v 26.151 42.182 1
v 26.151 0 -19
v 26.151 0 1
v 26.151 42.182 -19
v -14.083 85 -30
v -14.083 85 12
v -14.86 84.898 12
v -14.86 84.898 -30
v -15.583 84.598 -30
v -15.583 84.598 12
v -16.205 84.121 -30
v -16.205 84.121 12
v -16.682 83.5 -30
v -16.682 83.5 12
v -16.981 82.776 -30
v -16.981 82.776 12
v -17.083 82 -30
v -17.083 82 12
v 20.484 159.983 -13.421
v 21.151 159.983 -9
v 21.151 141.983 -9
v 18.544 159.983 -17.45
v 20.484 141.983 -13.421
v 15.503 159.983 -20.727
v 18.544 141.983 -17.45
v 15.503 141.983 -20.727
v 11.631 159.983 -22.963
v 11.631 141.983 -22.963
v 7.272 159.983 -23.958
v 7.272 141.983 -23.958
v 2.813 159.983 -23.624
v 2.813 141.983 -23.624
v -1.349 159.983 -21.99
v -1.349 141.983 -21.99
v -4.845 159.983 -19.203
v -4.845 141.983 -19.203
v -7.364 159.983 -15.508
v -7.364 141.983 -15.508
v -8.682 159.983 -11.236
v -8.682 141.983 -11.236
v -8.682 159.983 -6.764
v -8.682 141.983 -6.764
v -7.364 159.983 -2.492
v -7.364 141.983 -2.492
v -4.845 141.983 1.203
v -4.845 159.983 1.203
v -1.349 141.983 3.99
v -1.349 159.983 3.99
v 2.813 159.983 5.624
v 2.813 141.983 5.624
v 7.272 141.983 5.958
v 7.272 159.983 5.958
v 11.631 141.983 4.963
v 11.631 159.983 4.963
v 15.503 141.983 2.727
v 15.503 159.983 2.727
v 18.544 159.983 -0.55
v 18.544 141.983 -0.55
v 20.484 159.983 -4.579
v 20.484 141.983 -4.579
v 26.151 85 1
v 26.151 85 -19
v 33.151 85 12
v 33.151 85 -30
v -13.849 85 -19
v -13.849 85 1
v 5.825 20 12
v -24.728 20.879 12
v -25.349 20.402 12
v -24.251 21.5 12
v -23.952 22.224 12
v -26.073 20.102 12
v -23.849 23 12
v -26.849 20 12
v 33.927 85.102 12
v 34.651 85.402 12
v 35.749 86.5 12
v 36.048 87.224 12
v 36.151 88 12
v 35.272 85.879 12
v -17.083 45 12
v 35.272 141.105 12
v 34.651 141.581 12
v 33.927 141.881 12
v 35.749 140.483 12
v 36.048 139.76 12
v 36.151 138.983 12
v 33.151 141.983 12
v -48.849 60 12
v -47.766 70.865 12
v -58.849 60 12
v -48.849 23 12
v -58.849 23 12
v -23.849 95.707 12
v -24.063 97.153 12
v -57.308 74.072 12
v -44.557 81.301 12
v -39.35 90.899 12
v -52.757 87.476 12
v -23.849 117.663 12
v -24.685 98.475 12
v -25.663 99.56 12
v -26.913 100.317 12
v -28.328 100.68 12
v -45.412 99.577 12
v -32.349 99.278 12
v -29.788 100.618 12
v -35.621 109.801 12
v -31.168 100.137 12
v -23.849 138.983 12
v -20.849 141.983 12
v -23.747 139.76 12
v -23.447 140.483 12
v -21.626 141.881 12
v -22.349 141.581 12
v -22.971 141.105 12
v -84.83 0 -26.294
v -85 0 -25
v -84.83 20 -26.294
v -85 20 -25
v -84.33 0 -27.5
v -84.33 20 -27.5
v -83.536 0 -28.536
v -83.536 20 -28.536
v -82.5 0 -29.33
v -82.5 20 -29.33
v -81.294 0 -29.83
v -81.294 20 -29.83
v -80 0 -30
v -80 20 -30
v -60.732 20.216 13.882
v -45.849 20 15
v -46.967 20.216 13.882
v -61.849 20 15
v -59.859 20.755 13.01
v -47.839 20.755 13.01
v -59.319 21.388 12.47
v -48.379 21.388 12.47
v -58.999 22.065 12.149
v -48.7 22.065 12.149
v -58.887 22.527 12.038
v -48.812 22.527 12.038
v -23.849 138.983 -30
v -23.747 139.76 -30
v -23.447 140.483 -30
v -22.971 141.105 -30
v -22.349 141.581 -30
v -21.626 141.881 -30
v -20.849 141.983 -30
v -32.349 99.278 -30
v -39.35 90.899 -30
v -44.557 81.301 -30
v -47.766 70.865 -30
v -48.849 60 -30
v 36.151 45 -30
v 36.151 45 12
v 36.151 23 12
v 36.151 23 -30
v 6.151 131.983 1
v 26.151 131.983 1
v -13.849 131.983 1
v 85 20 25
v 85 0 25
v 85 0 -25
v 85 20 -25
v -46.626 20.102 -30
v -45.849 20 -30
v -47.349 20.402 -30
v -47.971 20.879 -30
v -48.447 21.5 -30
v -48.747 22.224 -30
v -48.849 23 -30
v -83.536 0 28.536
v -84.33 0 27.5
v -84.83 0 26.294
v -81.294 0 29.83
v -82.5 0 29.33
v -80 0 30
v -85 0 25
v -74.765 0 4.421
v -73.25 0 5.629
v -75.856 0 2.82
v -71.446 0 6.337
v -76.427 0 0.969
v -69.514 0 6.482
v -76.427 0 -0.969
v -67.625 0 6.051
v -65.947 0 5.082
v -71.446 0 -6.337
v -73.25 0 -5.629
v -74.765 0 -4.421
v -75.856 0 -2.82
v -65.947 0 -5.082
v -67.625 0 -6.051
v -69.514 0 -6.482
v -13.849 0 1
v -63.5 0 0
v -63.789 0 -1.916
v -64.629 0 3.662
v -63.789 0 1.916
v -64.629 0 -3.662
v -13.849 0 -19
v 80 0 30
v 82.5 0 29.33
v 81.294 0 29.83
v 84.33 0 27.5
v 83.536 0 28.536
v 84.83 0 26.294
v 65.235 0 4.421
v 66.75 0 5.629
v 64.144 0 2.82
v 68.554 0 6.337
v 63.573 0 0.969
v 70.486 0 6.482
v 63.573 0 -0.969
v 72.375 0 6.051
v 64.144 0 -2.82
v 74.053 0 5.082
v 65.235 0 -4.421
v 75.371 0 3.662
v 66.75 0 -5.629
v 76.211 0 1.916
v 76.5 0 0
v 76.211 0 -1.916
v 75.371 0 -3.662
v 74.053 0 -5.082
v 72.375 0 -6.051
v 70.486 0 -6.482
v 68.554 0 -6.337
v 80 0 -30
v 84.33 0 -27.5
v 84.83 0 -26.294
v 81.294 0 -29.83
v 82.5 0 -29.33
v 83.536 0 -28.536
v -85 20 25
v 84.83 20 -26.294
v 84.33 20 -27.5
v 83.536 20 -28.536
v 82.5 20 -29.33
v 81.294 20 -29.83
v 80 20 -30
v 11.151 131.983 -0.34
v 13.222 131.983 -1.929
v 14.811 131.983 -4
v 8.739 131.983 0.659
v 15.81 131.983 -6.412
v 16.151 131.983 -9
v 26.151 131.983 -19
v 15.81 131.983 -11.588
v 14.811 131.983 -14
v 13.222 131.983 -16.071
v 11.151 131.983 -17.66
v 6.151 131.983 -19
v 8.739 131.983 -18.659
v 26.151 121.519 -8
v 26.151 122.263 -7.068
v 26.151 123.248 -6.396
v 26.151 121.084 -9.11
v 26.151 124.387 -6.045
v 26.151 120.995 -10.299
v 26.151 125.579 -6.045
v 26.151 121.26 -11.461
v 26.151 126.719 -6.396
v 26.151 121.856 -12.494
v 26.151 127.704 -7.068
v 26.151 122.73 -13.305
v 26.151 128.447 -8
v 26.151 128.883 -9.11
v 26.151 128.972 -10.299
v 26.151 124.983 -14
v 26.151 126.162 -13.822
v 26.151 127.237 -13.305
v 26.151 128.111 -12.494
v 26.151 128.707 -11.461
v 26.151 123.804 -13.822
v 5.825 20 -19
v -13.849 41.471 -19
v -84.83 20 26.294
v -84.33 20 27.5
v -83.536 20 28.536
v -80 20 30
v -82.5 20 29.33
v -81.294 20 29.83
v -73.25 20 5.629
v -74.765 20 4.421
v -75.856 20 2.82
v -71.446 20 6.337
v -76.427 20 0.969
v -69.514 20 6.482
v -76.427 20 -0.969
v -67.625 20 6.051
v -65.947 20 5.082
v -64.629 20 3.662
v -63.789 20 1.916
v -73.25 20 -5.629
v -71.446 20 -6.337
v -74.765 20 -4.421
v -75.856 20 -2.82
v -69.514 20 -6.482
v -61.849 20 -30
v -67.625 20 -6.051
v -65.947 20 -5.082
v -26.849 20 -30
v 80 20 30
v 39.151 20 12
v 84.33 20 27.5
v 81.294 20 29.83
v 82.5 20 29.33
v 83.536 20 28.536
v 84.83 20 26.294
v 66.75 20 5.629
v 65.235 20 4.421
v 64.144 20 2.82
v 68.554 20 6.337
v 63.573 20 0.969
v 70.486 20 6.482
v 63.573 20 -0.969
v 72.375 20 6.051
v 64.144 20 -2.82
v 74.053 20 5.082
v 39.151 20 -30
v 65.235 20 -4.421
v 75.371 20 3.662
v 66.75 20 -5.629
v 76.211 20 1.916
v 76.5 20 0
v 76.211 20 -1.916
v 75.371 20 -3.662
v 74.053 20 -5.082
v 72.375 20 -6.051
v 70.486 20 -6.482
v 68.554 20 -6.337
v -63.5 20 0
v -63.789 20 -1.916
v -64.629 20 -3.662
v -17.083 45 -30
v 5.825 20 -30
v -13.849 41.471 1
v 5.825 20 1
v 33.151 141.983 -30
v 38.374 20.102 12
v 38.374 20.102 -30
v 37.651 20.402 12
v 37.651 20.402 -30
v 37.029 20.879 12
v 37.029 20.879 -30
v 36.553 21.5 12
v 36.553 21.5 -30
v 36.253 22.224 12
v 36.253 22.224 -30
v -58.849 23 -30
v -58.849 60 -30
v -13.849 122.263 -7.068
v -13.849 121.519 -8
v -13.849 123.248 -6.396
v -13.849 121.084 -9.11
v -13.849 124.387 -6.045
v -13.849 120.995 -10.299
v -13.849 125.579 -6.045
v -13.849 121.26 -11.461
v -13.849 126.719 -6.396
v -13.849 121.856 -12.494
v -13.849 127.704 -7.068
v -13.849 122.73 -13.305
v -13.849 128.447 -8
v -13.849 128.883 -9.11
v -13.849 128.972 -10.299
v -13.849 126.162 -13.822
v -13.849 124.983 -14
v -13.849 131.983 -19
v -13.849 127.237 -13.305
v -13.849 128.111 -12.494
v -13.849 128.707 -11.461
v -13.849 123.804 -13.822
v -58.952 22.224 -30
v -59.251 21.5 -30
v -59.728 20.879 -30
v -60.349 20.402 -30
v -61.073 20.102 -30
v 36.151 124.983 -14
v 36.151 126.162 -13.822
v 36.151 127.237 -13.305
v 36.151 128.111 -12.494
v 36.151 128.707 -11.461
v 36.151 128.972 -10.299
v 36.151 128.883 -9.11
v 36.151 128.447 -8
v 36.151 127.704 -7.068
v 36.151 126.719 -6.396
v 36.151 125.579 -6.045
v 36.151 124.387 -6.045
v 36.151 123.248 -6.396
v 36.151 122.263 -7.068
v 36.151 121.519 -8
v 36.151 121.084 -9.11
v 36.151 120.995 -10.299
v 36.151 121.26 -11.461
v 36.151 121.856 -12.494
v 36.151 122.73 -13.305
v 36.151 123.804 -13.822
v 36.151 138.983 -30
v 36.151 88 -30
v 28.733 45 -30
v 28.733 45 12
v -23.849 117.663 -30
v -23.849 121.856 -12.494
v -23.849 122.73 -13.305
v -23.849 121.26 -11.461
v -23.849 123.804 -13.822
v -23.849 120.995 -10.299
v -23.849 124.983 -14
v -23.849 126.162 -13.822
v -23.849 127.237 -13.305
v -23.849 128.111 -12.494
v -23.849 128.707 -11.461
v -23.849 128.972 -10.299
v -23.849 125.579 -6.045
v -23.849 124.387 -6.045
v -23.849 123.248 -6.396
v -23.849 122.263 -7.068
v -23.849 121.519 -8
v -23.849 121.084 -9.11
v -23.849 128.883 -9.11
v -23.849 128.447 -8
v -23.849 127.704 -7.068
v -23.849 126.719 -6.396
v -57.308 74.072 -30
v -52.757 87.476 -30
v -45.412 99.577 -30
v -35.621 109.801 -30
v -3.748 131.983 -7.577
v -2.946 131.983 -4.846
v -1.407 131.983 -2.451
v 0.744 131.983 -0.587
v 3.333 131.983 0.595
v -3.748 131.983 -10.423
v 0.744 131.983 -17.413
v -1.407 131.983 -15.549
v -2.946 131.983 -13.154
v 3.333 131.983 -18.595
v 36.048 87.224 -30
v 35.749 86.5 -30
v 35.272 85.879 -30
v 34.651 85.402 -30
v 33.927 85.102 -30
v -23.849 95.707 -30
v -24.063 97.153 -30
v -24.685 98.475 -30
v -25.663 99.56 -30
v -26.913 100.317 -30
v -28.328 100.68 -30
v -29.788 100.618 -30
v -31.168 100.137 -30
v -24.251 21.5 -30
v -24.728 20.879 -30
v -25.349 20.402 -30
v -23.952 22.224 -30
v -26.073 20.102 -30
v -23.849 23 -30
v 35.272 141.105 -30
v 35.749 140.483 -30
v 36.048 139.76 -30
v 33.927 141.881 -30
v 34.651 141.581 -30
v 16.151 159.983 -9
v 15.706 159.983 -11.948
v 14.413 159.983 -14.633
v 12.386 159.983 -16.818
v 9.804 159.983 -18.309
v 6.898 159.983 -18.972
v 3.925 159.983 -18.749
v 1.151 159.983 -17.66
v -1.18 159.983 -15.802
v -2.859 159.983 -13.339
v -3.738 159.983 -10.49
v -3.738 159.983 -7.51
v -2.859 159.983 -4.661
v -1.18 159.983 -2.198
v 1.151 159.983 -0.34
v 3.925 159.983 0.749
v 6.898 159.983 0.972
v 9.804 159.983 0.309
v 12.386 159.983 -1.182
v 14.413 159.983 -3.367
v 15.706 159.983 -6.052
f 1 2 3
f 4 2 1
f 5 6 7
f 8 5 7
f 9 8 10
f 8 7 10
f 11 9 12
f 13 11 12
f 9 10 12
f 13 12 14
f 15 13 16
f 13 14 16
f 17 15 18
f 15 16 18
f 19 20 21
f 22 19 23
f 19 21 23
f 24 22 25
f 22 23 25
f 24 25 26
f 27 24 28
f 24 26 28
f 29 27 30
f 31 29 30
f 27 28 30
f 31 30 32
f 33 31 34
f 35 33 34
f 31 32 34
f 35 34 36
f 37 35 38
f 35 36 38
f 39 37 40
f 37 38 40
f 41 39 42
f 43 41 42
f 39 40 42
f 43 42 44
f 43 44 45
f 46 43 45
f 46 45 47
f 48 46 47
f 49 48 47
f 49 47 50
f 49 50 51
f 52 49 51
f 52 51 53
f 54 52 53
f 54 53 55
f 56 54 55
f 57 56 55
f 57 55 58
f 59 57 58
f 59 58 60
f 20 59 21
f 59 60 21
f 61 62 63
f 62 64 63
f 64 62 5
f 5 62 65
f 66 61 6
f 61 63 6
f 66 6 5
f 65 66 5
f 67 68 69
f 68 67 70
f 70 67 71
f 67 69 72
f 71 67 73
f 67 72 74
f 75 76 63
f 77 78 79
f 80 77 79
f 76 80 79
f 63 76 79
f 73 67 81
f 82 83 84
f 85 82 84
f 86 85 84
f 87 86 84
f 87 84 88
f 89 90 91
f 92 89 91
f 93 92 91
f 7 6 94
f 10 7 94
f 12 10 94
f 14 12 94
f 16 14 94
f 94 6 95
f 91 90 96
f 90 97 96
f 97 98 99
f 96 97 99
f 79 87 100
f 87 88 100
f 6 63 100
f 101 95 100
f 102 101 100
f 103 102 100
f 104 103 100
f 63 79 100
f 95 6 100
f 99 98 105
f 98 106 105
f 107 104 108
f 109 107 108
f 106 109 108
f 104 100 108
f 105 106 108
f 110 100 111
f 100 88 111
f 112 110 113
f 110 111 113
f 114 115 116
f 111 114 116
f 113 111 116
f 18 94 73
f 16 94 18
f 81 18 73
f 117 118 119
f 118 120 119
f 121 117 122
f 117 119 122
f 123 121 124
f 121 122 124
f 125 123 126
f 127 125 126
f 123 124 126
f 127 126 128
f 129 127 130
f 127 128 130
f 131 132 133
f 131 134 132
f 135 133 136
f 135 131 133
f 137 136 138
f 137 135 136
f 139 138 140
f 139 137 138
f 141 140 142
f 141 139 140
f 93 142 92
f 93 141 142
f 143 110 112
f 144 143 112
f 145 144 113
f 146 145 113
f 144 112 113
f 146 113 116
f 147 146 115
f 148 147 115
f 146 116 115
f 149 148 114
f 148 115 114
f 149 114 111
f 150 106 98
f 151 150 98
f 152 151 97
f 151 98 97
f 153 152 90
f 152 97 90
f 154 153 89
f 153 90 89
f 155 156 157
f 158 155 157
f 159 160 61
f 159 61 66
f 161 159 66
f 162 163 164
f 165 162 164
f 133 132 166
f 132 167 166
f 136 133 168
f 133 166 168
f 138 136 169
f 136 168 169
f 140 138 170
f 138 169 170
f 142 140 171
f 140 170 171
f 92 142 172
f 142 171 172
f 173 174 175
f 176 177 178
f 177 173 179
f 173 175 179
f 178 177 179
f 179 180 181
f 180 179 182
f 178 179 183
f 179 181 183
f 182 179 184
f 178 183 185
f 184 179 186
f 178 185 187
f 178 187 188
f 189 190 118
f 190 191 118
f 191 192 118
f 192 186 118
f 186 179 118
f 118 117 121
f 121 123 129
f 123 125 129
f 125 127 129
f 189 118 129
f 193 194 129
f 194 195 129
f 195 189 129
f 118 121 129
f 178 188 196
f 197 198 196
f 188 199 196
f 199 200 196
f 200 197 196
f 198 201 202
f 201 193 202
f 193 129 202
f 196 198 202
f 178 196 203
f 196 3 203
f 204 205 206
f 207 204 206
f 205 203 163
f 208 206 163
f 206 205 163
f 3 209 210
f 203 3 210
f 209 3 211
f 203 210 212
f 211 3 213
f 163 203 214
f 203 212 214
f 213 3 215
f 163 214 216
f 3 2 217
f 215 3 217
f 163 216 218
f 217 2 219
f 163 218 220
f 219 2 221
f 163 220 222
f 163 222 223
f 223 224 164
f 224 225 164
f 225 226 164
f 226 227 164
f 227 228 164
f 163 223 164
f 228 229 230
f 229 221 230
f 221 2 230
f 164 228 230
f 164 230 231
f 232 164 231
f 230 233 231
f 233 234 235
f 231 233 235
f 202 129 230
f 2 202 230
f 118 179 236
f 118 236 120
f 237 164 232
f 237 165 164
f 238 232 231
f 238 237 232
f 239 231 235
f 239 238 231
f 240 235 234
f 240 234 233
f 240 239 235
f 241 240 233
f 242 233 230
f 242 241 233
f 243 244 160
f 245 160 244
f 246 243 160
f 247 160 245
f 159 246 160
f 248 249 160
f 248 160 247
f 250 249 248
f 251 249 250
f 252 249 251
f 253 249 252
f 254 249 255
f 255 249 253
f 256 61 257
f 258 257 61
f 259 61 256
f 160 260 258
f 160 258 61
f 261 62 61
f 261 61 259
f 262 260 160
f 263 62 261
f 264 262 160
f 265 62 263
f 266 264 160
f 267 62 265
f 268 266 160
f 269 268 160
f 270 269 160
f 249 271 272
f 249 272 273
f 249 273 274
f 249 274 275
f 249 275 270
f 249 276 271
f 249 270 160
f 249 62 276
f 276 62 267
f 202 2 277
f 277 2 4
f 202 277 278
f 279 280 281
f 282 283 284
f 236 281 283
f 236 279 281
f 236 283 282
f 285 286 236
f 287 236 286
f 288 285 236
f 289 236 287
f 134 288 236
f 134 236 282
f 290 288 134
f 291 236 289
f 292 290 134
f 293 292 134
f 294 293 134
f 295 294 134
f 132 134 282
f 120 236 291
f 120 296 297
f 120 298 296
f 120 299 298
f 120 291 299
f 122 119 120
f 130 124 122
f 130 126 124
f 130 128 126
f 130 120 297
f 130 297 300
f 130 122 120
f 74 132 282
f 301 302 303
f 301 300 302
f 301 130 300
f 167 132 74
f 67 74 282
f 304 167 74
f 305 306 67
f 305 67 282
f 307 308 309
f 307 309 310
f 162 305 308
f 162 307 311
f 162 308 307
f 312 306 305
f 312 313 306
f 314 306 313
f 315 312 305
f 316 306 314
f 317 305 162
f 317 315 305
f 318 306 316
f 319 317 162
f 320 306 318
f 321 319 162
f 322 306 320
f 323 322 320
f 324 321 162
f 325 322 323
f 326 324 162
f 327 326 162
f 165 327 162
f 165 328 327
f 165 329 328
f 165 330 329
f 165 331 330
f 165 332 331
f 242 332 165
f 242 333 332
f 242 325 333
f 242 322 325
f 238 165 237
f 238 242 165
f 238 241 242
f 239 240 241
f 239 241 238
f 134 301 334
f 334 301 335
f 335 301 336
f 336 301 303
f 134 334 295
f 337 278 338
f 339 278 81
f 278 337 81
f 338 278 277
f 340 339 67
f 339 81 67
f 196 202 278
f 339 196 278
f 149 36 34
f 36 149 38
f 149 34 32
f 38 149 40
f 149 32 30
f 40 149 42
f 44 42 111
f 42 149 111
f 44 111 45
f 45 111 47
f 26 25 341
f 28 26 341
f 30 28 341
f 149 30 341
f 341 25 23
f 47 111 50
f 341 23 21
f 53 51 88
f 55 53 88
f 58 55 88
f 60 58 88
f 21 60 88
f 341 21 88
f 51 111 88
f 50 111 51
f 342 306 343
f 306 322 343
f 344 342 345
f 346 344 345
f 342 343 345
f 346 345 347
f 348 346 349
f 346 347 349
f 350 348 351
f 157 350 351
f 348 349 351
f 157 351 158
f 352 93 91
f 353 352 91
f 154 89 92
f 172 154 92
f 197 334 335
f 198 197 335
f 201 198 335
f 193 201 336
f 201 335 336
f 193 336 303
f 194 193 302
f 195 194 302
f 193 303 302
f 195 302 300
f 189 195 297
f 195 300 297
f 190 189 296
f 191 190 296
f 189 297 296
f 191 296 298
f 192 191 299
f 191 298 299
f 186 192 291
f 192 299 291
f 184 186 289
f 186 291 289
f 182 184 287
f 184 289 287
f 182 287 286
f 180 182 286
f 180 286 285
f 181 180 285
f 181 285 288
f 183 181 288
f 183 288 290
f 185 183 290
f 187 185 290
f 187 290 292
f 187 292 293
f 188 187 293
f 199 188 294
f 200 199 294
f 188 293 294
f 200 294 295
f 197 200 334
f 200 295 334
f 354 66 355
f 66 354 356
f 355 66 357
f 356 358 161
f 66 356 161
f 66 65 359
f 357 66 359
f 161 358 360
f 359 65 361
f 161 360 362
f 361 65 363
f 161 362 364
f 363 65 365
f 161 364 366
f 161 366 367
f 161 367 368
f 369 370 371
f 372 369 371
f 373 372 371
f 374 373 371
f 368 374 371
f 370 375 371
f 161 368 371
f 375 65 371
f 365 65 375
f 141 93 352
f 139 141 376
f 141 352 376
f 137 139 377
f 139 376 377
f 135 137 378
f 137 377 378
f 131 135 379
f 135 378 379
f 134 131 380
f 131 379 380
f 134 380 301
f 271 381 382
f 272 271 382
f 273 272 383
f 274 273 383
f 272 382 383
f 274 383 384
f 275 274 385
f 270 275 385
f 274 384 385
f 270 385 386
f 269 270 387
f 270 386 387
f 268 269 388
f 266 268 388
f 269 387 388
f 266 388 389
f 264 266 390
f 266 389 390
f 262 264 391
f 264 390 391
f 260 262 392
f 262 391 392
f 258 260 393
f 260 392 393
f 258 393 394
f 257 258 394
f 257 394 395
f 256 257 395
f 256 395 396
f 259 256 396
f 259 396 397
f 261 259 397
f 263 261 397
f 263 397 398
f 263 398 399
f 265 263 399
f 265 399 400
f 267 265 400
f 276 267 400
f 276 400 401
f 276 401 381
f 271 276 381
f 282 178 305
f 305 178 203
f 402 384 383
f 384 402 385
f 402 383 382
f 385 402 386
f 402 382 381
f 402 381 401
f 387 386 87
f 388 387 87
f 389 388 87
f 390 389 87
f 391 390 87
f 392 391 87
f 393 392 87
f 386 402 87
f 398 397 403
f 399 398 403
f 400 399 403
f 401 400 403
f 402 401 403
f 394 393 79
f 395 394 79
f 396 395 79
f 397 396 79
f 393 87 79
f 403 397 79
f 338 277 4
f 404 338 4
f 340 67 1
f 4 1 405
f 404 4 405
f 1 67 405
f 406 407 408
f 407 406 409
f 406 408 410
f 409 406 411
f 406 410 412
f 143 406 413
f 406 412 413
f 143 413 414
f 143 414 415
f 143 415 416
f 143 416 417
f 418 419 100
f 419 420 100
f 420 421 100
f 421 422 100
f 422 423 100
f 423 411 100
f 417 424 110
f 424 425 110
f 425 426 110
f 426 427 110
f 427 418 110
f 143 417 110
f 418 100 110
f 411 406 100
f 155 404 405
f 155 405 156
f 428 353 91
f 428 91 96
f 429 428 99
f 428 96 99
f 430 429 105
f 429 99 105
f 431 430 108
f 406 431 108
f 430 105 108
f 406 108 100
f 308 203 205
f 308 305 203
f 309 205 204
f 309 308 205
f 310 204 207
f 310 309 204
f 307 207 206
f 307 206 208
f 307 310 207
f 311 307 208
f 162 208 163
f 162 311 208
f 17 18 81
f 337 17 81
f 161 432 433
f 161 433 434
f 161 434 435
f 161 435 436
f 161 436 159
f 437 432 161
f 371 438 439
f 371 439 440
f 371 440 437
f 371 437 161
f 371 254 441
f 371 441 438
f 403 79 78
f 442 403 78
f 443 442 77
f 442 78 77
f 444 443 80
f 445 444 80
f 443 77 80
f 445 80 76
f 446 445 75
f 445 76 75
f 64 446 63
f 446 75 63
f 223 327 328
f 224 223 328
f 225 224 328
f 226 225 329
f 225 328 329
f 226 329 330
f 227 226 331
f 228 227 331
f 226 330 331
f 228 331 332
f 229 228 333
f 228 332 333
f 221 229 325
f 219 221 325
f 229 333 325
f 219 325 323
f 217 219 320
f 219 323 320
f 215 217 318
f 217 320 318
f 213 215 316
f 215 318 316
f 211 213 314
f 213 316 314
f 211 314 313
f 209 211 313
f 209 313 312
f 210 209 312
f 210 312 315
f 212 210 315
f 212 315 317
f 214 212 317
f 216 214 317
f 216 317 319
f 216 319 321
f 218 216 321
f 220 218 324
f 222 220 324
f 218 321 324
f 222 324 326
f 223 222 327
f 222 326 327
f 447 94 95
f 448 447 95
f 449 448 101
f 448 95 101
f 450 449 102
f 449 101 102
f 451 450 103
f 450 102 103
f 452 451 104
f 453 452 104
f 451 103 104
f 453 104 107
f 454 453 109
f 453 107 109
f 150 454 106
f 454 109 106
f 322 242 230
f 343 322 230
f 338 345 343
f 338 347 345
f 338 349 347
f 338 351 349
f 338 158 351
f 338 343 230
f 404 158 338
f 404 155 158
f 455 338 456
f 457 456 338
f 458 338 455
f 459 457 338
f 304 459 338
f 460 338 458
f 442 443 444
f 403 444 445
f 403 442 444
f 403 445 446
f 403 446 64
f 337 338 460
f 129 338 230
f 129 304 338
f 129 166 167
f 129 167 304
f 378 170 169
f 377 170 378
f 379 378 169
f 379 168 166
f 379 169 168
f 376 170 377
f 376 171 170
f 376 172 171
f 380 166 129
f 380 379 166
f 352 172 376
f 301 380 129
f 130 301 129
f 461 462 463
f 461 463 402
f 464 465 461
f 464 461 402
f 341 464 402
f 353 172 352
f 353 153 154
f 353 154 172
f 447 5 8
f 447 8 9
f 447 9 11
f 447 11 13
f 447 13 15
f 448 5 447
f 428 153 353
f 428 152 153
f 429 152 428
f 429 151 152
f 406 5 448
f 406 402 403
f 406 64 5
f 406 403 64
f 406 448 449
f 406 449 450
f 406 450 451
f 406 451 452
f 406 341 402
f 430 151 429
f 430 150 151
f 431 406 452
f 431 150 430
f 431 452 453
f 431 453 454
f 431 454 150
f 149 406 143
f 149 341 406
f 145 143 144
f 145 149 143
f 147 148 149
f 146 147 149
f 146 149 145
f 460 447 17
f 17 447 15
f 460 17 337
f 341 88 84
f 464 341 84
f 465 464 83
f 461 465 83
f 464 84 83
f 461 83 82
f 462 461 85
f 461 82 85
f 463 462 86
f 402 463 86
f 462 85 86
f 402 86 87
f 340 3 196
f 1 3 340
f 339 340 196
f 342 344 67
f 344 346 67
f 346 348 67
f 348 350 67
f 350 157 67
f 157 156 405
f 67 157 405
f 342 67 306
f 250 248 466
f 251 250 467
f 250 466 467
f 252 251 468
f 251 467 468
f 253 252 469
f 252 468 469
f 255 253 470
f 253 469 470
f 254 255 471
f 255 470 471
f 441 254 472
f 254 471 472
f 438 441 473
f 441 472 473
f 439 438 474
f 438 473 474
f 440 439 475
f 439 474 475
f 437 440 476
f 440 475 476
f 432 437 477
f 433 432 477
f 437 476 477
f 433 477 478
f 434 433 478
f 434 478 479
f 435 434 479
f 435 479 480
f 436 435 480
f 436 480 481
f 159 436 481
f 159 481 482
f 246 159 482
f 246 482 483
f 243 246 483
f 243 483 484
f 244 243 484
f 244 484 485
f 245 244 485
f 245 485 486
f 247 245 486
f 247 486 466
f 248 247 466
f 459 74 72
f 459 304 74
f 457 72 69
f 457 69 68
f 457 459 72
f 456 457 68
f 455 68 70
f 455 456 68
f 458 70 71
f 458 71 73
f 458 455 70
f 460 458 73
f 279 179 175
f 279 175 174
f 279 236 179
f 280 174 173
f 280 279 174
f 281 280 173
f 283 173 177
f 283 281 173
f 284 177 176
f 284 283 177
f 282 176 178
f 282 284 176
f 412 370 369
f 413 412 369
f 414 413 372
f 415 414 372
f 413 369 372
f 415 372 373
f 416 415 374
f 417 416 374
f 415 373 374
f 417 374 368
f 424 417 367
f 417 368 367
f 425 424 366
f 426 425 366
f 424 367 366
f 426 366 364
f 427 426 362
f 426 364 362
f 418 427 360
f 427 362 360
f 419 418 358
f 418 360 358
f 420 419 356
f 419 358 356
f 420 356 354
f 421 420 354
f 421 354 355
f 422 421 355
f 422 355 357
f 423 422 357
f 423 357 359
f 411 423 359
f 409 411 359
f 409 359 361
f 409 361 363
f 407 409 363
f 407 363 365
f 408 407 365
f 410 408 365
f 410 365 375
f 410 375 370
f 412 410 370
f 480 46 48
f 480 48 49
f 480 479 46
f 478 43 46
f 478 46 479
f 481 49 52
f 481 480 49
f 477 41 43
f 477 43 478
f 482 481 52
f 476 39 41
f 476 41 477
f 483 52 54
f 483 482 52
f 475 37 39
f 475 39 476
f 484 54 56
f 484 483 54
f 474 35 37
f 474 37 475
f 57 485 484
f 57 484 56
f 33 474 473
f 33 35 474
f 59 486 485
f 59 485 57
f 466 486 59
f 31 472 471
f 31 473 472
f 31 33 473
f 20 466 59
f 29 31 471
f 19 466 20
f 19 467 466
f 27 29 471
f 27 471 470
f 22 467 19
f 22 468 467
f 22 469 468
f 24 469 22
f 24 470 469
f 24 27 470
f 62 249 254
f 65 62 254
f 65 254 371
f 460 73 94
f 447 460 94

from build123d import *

# Parameters (mm, degrees)
SKETCH1_W           = 170
SKETCH1_H           = 60
BOSS_EXTRUDE1_DEPTH = 20
FILLET1_R           = 5
BOSS_EXTRUDE2_DEPTH = 42
SKETCH5_R           = 15
BOSS_EXTRUDE3_DEPTH = 18
SKETCH6_R           = 10
CUT_EXTRUDE1_DEPTH  = 28
SKETCH7_W           = 40
SKETCH7_H           = 131.983318458
CUT_EXTRUDE2_DEPTH  = 10
FILLET5_R           = 3
SKETCH8_R           = 6.5
CUT_EXTRUDE3_DEPTH  = 20
SKETCH9_R           = 4
CUT_EXTRUDE4_DEPTH  = 60


with BuildPart() as part:
    # Sketch1 → Boss-Extrude1 (new body)
    with BuildSketch(Plane(origin=(0, 0, 0), x_dir=(1, 0, 0), z_dir=(0, 1, 0))):
        Rectangle(SKETCH1_W, SKETCH1_H)
    extrude(amount=BOSS_EXTRUDE1_DEPTH)

    # Fillet1
    fillet1_edges = [part.edges().sort_by_distance(p)[0] for p in [
        (-85, 10, -30),
        (85, 10, -30),
        (85, 10, 30),
        (-85, 10, 30),
    ]]
    fillet(fillet1_edges, radius=FILLET1_R)

    # Sketch4 → Boss-Extrude2 (add)
    with BuildSketch(Plane(origin=(0, 0, 12), x_dir=(-1, 0, 0), z_dir=(0, 0, -1))):
        with BuildLine():
            Line((48.849351026, 20), (58.849351026, 20))
            Line((58.849351026, 20), (58.849351026, 60))
            ThreePointArc((58.849351026, 60), (49.414627953, 93.726843908), (23.849351026, 117.662812973))
            Line((23.849351026, 117.662812973), (23.849351026, 138.983318458))
            ThreePointArc((23.849351026, 138.983318458), (22.970671369, 141.104638801), (20.849351026, 141.983318458))
            Line((20.849351026, 141.983318458), (-33.150648974, 141.983318458))
            ThreePointArc((-33.150648974, 141.983318458), (-35.271969318, 141.104638801), (-36.150648974, 138.983318458))
            Line((-36.150648974, 138.983318458), (-36.150648974, 88))
            ThreePointArc((-36.150648974, 88), (-35.271969318, 85.878679656), (-33.150648974, 85))
            Line((-33.150648974, 85), (14.083425542, 85))
            ThreePointArc((14.083425542, 85), (16.204745885, 84.121320344), (17.083425542, 82))
            Line((17.083425542, 82), (17.083425542, 45))
            Line((17.083425542, 45), (-5.824853809, 20))
            Line((-5.824853809, 20), (23.849351026, 20))
            Line((23.849351026, 20), (23.849351026, 95.707142143))
            ThreePointArc((23.849351026, 95.707142143), (26.912859353, 100.316914371), (32.349351026, 99.277856357))
            ThreePointArc((32.349351026, 99.277856357), (44.556845541, 81.301408404), (48.849351026, 60))
            Line((48.849351026, 60), (48.849351026, 20))
        make_face()
        Polygon((-36.150648974, 20), (-5.824853809, 20), (-28.733133159, 45), (-36.150648974, 45), align=None)
    extrude(amount=BOSS_EXTRUDE2_DEPTH)

    # Sketch5 → Boss-Extrude3 (add)
    with BuildSketch(Plane(origin=(0, 141.983318458, 0), x_dir=(1, 0, 0), z_dir=(0, 1, 0))):
        with Locations((6.150648974, 9)):
            Circle(SKETCH5_R)
    extrude(amount=BOSS_EXTRUDE3_DEPTH)

    # Sketch6 → Cut-Extrude1 (cut)
    with BuildSketch(Plane(origin=(0, 159.983318458, 0), x_dir=(1, 0, 0), z_dir=(0, 1, 0))):
        with Locations((6.150648974, 9)):
            Circle(SKETCH6_R)
    extrude(amount=-CUT_EXTRUDE1_DEPTH, mode=Mode.SUBTRACT)

    # Sketch7 → Cut-Extrude2 (cut, symmetric)
    with BuildSketch(Plane(origin=(0, 0, -9), x_dir=(-1, 0, 0), z_dir=(0, 0, -1))):
        with Locations((-6.150648974, 65.991659229)):
            Rectangle(SKETCH7_W, SKETCH7_H)
    extrude(amount=CUT_EXTRUDE2_DEPTH, both=True, mode=Mode.SUBTRACT)

    # Fillet5
    fillet5_edges = [part.edges().sort_by_distance(p)[0] for p in [
        (36.150648974, 20, -9),
        (-23.849351026, 20, -9),
        (-48.849351026, 20, -9),
        (-53.849351026, 20, 12),
        (-58.849351026, 20, -9),
    ]]
    fillet(fillet5_edges, radius=FILLET5_R)

    # Sketch8 → Cut-Extrude3 (cut)
    with BuildSketch(Plane(origin=(0, 20, 0), x_dir=(1, 0, 0), z_dir=(0, 1, 0))):
        with Locations((-70, 0)):
            Circle(SKETCH8_R)
        with Locations((70, 0)):
            Circle(SKETCH8_R)
    extrude(amount=-CUT_EXTRUDE3_DEPTH, mode=Mode.SUBTRACT)

    # Sketch9 → Cut-Extrude4 (cut)
    with BuildSketch(Plane(origin=(36.150648974, 0, 0), x_dir=(0, 0, -1), z_dir=(1, 0, 0))):
        with Locations((10, 124.983318458)):
            Circle(SKETCH9_R)
    extrude(amount=-CUT_EXTRUDE4_DEPTH, mode=Mode.SUBTRACT)


solid = part.part
